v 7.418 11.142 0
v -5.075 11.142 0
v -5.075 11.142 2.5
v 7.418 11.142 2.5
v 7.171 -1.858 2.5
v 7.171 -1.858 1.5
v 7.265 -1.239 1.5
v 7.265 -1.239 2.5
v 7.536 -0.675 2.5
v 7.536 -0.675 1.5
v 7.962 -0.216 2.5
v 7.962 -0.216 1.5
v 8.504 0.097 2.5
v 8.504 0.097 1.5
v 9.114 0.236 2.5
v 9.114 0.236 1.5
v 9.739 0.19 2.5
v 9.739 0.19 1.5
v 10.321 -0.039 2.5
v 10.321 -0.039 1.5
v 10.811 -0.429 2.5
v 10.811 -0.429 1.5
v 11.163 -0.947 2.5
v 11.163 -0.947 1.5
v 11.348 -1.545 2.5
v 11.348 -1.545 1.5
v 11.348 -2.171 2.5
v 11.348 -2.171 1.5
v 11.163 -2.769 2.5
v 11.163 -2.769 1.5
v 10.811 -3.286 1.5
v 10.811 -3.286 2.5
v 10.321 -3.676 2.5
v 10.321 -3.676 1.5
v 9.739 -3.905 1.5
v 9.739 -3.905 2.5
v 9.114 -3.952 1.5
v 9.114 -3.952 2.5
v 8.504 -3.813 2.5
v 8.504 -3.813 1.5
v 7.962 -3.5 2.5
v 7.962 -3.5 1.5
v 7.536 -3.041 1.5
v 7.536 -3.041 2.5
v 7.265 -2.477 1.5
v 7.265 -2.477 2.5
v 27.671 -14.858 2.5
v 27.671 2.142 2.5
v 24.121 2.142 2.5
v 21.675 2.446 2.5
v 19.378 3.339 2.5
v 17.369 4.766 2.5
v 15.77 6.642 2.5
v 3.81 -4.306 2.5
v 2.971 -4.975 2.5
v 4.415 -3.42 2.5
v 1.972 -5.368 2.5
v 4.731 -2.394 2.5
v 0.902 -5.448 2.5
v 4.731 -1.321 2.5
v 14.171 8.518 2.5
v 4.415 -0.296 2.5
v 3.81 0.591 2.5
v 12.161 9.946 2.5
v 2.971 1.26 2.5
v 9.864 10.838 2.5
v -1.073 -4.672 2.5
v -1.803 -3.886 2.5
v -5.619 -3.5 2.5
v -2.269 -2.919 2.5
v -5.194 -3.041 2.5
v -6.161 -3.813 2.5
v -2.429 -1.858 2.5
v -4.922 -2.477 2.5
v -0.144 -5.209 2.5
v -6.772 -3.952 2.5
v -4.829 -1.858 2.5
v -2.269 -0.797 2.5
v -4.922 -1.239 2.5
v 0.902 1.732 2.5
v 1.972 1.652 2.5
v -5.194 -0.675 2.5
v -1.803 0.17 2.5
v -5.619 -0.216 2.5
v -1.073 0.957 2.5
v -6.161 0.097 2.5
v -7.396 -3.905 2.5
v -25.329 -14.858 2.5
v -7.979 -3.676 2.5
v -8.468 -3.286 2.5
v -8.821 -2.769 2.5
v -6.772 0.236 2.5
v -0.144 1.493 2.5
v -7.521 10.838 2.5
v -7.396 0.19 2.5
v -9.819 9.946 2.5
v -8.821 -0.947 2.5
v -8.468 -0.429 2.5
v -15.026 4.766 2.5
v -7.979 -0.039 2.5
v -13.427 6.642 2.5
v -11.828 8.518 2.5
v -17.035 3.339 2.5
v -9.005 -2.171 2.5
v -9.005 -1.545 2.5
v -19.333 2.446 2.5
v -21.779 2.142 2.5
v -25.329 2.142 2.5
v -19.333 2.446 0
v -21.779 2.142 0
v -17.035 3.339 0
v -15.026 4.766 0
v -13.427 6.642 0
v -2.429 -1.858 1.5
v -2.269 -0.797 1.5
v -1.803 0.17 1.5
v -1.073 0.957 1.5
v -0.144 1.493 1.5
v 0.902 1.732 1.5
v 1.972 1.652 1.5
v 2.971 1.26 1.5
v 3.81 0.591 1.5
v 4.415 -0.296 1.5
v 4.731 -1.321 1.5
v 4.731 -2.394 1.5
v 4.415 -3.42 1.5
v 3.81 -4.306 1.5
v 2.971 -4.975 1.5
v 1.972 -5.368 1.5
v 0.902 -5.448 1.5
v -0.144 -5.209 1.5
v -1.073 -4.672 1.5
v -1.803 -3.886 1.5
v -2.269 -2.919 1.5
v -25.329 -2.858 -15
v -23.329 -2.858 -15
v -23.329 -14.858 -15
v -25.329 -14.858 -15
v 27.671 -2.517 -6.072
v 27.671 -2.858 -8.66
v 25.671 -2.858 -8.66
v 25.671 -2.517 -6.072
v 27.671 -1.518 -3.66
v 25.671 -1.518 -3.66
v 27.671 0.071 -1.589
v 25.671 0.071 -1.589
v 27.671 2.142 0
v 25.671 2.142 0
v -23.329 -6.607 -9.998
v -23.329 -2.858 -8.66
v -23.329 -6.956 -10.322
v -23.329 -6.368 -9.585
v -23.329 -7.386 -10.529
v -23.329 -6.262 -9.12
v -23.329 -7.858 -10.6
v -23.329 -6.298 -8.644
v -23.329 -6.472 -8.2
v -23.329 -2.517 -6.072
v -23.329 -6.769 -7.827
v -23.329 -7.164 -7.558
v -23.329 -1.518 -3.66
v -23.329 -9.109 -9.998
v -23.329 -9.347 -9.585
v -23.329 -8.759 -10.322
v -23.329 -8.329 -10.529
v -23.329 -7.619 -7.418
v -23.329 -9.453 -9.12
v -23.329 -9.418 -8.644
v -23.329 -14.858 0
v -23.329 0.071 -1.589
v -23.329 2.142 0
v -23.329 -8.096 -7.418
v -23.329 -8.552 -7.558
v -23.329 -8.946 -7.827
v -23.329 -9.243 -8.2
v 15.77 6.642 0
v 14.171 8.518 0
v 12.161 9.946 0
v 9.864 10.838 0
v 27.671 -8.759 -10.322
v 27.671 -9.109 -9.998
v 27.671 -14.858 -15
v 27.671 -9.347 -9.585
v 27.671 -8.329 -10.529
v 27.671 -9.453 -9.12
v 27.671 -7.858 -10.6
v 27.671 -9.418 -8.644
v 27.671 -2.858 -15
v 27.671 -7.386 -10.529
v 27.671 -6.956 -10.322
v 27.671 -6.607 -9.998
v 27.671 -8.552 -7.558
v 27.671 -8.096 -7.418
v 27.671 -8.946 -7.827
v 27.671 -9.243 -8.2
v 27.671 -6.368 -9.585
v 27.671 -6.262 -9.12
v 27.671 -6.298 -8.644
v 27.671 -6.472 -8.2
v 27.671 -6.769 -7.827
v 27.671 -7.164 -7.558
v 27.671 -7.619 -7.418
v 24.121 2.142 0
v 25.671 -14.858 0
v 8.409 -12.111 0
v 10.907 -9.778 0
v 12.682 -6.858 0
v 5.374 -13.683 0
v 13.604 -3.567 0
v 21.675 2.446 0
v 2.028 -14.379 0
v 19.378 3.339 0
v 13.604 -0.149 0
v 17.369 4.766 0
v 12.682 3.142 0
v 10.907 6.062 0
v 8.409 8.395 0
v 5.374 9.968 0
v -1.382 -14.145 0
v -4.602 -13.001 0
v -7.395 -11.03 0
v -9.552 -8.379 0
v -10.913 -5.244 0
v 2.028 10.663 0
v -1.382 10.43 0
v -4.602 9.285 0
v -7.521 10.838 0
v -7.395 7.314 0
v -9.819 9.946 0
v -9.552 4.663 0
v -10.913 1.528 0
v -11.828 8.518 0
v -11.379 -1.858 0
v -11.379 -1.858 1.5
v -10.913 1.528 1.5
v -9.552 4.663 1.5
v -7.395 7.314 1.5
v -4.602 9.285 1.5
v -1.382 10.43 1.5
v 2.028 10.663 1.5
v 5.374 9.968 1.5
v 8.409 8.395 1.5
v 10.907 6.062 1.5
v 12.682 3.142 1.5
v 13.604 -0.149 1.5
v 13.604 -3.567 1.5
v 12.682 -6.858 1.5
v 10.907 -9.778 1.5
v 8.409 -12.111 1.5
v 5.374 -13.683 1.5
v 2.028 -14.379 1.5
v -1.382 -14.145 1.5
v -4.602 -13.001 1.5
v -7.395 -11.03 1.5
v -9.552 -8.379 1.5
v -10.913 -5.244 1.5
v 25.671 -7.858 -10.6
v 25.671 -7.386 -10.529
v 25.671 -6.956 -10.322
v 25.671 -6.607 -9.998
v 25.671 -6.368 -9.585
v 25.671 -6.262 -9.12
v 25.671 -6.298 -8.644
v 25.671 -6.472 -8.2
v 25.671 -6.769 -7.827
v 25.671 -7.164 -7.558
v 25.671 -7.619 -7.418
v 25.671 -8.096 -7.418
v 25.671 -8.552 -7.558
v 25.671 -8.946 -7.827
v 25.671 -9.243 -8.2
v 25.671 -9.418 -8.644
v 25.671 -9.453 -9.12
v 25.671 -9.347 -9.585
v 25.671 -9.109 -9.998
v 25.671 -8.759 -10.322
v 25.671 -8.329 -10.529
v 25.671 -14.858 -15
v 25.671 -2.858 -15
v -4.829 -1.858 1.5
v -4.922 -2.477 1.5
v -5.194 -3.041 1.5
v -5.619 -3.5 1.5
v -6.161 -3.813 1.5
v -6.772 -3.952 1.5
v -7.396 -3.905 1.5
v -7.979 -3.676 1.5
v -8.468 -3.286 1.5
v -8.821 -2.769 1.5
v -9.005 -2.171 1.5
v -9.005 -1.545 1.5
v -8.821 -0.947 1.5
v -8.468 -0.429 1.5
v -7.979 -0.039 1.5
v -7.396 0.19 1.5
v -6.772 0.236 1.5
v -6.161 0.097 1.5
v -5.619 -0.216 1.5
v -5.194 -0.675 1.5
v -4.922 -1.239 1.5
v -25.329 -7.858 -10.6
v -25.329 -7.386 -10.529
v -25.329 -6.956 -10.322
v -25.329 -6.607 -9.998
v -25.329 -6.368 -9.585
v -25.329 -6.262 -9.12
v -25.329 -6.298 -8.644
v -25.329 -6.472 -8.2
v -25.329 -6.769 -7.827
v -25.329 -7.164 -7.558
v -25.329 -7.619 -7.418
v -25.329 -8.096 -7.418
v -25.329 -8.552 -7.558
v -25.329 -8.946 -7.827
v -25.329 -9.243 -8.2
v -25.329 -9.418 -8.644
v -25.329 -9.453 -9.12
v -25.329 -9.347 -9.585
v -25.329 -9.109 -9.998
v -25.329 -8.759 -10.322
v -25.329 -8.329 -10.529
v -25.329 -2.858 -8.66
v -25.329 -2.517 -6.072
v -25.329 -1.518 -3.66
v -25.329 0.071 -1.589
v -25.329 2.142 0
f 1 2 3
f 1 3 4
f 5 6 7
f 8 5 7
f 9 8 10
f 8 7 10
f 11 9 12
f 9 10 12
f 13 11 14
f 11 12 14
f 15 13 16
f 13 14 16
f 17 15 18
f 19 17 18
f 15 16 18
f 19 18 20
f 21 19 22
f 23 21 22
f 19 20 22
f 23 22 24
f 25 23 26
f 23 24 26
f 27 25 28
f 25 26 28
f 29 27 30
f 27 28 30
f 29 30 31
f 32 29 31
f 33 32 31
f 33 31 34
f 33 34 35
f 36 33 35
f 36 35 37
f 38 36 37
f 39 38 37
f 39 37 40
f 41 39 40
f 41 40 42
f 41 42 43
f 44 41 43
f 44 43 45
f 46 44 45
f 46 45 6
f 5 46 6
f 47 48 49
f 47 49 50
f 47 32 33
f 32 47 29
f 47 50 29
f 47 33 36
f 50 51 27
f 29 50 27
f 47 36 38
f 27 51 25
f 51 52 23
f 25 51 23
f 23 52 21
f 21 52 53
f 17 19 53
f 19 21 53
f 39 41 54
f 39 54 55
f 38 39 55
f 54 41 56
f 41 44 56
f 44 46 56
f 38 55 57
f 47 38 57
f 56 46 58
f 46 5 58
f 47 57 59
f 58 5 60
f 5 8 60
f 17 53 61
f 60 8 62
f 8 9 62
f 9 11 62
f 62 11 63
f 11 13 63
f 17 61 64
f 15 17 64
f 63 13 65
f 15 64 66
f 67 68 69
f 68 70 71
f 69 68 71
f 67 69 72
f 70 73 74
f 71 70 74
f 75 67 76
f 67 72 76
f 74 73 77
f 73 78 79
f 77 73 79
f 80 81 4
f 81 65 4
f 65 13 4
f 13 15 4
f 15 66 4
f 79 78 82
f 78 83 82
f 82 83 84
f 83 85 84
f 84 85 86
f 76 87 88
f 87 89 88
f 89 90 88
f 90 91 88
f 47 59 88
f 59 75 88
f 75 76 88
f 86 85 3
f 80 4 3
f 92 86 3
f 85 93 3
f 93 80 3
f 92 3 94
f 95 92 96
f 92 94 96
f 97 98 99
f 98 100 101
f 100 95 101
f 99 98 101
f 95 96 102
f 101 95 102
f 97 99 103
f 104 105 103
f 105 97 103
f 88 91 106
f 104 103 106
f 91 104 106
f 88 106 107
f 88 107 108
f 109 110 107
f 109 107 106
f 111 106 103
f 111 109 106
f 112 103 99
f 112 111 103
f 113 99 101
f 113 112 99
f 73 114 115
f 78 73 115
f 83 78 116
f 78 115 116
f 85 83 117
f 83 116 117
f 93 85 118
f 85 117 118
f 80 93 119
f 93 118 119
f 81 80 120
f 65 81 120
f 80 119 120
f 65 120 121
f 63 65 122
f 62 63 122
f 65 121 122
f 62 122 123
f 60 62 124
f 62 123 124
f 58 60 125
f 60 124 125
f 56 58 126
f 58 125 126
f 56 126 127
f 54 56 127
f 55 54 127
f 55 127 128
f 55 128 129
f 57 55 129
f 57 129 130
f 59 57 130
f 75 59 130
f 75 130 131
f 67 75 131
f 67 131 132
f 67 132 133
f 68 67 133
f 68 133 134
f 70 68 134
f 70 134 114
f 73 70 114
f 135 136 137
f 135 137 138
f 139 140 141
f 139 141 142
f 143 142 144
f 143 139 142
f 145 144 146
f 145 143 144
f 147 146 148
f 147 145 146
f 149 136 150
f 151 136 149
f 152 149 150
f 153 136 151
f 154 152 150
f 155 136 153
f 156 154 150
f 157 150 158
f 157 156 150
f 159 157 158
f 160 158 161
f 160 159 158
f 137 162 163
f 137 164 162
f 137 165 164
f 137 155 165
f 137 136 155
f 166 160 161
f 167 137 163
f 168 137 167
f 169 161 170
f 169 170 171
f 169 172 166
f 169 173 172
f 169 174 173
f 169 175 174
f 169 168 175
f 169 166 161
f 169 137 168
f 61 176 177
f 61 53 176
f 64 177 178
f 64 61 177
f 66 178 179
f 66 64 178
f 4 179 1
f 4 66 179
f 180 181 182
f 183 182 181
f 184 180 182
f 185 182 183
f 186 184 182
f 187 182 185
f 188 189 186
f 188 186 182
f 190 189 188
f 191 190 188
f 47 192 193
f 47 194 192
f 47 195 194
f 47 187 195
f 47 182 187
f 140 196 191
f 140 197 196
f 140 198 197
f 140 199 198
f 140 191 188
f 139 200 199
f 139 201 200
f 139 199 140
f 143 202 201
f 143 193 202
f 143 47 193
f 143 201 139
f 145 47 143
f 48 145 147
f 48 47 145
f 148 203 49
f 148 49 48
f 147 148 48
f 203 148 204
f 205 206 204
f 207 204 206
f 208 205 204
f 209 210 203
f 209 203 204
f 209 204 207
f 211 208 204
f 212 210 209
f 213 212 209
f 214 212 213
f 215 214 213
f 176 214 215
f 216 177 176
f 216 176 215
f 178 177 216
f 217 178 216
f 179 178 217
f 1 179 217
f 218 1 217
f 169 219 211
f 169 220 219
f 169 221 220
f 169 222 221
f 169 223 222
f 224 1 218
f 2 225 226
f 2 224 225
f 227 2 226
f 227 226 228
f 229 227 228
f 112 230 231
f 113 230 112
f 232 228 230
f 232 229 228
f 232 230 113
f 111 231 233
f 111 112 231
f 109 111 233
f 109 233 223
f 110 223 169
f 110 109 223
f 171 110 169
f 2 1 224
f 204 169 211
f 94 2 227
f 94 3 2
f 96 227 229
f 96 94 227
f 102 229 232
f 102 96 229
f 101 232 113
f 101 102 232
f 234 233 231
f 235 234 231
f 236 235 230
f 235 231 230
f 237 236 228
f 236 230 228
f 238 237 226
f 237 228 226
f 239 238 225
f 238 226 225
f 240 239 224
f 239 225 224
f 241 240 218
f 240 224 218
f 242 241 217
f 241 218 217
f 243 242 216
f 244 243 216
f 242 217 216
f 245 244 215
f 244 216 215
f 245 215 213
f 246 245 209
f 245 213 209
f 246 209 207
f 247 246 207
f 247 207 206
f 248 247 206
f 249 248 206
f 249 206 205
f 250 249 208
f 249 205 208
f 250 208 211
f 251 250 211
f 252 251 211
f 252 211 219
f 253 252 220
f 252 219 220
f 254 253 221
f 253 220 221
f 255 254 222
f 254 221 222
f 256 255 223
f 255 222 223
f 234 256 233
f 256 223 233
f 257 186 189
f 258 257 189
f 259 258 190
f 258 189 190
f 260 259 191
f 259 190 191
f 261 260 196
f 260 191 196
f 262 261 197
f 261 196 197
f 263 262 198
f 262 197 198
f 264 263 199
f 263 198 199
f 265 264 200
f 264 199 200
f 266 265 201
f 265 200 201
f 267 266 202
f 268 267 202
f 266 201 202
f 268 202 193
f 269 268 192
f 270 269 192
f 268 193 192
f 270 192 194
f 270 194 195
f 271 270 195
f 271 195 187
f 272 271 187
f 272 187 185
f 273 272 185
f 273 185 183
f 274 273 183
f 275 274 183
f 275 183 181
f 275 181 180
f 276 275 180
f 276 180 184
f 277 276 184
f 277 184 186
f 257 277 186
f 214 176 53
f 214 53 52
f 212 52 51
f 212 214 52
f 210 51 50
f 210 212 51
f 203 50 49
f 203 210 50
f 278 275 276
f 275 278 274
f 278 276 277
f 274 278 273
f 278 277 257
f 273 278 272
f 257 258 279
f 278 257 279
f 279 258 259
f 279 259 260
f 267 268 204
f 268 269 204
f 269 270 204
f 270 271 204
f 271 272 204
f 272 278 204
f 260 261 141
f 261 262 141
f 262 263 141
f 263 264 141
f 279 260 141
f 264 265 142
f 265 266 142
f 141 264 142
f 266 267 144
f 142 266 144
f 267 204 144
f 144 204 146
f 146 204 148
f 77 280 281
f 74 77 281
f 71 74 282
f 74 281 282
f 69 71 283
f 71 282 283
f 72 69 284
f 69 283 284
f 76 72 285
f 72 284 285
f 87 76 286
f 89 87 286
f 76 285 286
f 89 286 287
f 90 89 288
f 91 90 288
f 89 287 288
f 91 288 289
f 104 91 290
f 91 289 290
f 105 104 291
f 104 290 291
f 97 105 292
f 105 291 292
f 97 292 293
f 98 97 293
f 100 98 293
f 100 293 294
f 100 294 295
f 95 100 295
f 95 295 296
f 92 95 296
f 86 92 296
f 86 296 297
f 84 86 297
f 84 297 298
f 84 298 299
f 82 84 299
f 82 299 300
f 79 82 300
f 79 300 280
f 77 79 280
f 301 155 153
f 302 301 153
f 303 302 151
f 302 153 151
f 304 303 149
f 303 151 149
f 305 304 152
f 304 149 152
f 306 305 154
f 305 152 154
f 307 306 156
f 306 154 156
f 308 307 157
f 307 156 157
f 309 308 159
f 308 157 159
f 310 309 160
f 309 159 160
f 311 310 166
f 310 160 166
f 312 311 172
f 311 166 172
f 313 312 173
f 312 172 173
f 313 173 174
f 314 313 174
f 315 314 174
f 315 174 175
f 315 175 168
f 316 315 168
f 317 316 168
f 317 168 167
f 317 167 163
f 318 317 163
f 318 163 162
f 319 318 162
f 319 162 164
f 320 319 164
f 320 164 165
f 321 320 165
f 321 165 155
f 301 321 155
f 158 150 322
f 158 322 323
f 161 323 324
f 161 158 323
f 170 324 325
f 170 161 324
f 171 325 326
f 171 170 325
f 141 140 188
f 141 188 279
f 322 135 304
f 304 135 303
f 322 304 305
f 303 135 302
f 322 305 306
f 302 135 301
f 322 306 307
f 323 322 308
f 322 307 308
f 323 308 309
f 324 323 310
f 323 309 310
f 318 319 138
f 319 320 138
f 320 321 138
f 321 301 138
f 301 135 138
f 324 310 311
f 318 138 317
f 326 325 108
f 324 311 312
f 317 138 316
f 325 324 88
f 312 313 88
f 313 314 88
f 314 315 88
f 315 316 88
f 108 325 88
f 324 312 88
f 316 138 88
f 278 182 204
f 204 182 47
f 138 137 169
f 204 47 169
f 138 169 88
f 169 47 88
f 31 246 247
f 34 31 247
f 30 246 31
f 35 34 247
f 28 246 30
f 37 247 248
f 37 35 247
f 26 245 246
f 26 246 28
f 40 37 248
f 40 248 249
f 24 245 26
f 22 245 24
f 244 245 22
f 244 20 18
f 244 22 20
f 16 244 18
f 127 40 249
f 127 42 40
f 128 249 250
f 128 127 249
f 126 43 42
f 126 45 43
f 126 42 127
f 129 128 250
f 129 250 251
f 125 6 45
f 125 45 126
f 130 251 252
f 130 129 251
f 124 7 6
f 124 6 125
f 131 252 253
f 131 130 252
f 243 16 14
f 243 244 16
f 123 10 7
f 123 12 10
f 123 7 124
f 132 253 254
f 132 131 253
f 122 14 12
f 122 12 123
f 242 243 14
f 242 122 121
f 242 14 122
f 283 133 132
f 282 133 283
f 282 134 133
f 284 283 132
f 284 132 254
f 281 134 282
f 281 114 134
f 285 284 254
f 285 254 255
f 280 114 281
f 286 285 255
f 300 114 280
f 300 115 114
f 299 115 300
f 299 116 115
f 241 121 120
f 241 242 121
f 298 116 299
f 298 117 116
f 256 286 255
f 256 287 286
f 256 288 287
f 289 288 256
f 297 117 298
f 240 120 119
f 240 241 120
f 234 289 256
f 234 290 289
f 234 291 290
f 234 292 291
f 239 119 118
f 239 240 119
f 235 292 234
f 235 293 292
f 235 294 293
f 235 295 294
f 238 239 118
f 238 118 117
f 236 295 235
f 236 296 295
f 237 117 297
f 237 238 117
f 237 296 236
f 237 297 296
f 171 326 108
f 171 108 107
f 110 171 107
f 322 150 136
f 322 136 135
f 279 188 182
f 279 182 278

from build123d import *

# Parameters (mm, degrees)
BOSS_EXTRUDE1_DEPTH = 2.5
SKETCH4_R           = 12.55
CUT_EXTRUDE1_DEPTH  = 1.5
CUT_EXTRUDE2_REACH  = 33.444
SKETCH5_R           = 2.1
SKETCH5_R_2         = 3.6
SKETCH8_W           = 2
SKETCH8_H           = 12
BOSS_EXTRUDE3_DEPTH = 15
FILLET3_R           = 10
FILLET4_R           = 10
SKETCH9_R           = 1.6
CUT_EXTRUDE3_DEPTH  = 58.050444972


with BuildPart() as part:
    # Sketch3 → Boss-Extrude1 (new body)
    with BuildSketch(Plane.XY):
        Polygon((-11.828665208, 11.142231947), (14.171334792, 11.142231947), (14.171334792, 2.142231947), (27.671334792, 2.142231947), (27.671334792, -14.857768053), (-25.328665208, -14.857768053), (-25.328665208, 2.142231947), (-11.828665208, 2.142231947), align=None)
    extrude(amount=BOSS_EXTRUDE1_DEPTH)

    # Sketch4 → Cut-Extrude1 (cut)
    with BuildSketch(Plane(origin=(0, 0, 0), x_dir=(-1, 0, 0), z_dir=(0, 0, -1))):
        with Locations((-1.171334792, -1.857768053)):
            Circle(SKETCH4_R)
    extrude(amount=-CUT_EXTRUDE1_DEPTH, mode=Mode.SUBTRACT)

    # Sketch5 → Cut-Extrude2 (cut, up to next)
    with BuildSketch(Plane(origin=(0, 0, 1.5), x_dir=(-1, 0, 0), z_dir=(0, 0, -1)), mode=Mode.PRIVATE) as cut_extrude2_sk1:
        with Locations((-9.271334792, -1.857768053)):
            Circle(SKETCH5_R)
    cut_extrude2_tool1 = extrude(cut_extrude2_sk1.sketch, amount=-CUT_EXTRUDE2_REACH, mode=Mode.PRIVATE) & part.part
    # Sketch5 → Cut-Extrude2 (cut, up to next)
    with BuildSketch(Plane(origin=(0, 0, 1.5), x_dir=(-1, 0, 0), z_dir=(0, 0, -1)), mode=Mode.PRIVATE) as cut_extrude2_sk2:
        with Locations(Location((6.928665208, -1.857768053, 0), (0, 0, 180))):
            Circle(SKETCH5_R)
    cut_extrude2_tool2 = extrude(cut_extrude2_sk2.sketch, amount=-CUT_EXTRUDE2_REACH, mode=Mode.PRIVATE) & part.part
    # Sketch5 → Cut-Extrude2 (cut, up to next)
    with BuildSketch(Plane(origin=(0, 0, 1.5), x_dir=(-1, 0, 0), z_dir=(0, 0, -1)), mode=Mode.PRIVATE) as cut_extrude2_sk3:
        with Locations((-1.171334792, -1.857768053)):
            Circle(SKETCH5_R_2)
    cut_extrude2_tool3 = extrude(cut_extrude2_sk3.sketch, amount=-CUT_EXTRUDE2_REACH, mode=Mode.PRIVATE) & part.part
    add(cut_extrude2_tool1.solids().sort_by_distance((9.271335, -1.857768, 1.5))[0], mode=Mode.SUBTRACT)
    add(cut_extrude2_tool2.solids().sort_by_distance((-6.928665, -1.857768, 1.5))[0], mode=Mode.SUBTRACT)
    add(cut_extrude2_tool3.solids().sort_by_distance((1.171335, -1.857768, 1.5))[0], mode=Mode.SUBTRACT)

    # Sketch8 → Boss-Extrude3 (add)
    with BuildSketch(Plane(origin=(0, 0, 0), x_dir=(-1, 0, 0), z_dir=(0, 0, -1))):
        with Locations((-26.671334792, -8.857768053)):
            Rectangle(SKETCH8_W, SKETCH8_H)
        with Locations((24.328665208, -8.857768053)):
            Rectangle(SKETCH8_W, SKETCH8_H)
    extrude(amount=BOSS_EXTRUDE3_DEPTH)

    # Fillet3
    # the kernel refuses this fillet: 10 mm, written as the material it adds along each edge
    with BuildSketch(Plane(origin=(-11.828665208, 2.142231947, 0), x_dir=(-1, 0, 0), z_dir=(0, 0, 1))) as fillet3_piece_1:
        with BuildLine():
            CenterArc((9.949874371, -10), FILLET3_R, 90, 84.260829523)
            Line((0, -9), (-0.198997487, -8.98))
            ThreePointArc((-0.198997487, -8.98), (-0.2, -4.5), (-0.2, 0))
            Line((-0.2, 0), (0, 0.2))
            Line((0, 0.2), (9.949874371, 0.2))
            Line((9.949874371, 0.2), (9.949874371, 0))
        make_face()
    extrude(amount=2.5)
    with BuildSketch(Plane(origin=(14.171334792, 2.142231947, 0), x_dir=(1, 0, 0), z_dir=(0, 0, 1))) as fillet3_piece_2:
        with BuildLine():
            CenterArc((9.949874371, 10), FILLET3_R, 185.739170477, 84.260829523)
            Line((0, 9), (-0.198997487, 8.98))
            ThreePointArc((-0.198997487, 8.98), (-0.2, 4.5), (-0.2, 0))
            Line((-0.2, 0), (0, -0.2))
            Line((0, -0.2), (9.949874371, -0.2))
            Line((9.949874371, -0.2), (9.949874371, 0))
        make_face()
    extrude(amount=2.5)
    with BuildSketch(Plane(origin=(-23.328665208, -2.857768053, 0), x_dir=(0, 0, -1), z_dir=(-1, 0, 0)), Plane(origin=(27.671334792, -2.857768053, 0), x_dir=(0, 0, -1), z_dir=(-1, 0, 0))) as fillet3_piece_3:
        with BuildLine():
            CenterArc((8.660254038, -10), FILLET3_R, 90, 60)
            Line((0, -5), (-0.173205081, -4.9))
            ThreePointArc((-0.173205081, -4.9), (-0.2, -2.5), (-0.2, 0))
            Line((-0.2, 0), (0, 0.2))
            Line((0, 0.2), (8.660254038, 0.2))
            Line((8.660254038, 0.2), (8.660254038, 0))
        make_face()
    extrude(amount=2)

    # Fillet4
    fillet4_edges = [part.edges().sort_by_distance(p)[0] for p in [
        (-11.828665208, 11.142231947, 1.25),
        (14.171334792, 11.142231947, 1.25),
    ]]
    fillet(fillet4_edges, radius=FILLET4_R)

    # Sketch9 → Cut-Extrude3 (cut, through all)
    with BuildSketch(Plane(origin=(27.671334792, 0, 0), x_dir=(0, 0, -1), z_dir=(1, 0, 0))):
        with Locations((9, -7.857768053)):
            Circle(SKETCH9_R)
    extrude(amount=-CUT_EXTRUDE3_DEPTH, mode=Mode.SUBTRACT)


solid = part.part
